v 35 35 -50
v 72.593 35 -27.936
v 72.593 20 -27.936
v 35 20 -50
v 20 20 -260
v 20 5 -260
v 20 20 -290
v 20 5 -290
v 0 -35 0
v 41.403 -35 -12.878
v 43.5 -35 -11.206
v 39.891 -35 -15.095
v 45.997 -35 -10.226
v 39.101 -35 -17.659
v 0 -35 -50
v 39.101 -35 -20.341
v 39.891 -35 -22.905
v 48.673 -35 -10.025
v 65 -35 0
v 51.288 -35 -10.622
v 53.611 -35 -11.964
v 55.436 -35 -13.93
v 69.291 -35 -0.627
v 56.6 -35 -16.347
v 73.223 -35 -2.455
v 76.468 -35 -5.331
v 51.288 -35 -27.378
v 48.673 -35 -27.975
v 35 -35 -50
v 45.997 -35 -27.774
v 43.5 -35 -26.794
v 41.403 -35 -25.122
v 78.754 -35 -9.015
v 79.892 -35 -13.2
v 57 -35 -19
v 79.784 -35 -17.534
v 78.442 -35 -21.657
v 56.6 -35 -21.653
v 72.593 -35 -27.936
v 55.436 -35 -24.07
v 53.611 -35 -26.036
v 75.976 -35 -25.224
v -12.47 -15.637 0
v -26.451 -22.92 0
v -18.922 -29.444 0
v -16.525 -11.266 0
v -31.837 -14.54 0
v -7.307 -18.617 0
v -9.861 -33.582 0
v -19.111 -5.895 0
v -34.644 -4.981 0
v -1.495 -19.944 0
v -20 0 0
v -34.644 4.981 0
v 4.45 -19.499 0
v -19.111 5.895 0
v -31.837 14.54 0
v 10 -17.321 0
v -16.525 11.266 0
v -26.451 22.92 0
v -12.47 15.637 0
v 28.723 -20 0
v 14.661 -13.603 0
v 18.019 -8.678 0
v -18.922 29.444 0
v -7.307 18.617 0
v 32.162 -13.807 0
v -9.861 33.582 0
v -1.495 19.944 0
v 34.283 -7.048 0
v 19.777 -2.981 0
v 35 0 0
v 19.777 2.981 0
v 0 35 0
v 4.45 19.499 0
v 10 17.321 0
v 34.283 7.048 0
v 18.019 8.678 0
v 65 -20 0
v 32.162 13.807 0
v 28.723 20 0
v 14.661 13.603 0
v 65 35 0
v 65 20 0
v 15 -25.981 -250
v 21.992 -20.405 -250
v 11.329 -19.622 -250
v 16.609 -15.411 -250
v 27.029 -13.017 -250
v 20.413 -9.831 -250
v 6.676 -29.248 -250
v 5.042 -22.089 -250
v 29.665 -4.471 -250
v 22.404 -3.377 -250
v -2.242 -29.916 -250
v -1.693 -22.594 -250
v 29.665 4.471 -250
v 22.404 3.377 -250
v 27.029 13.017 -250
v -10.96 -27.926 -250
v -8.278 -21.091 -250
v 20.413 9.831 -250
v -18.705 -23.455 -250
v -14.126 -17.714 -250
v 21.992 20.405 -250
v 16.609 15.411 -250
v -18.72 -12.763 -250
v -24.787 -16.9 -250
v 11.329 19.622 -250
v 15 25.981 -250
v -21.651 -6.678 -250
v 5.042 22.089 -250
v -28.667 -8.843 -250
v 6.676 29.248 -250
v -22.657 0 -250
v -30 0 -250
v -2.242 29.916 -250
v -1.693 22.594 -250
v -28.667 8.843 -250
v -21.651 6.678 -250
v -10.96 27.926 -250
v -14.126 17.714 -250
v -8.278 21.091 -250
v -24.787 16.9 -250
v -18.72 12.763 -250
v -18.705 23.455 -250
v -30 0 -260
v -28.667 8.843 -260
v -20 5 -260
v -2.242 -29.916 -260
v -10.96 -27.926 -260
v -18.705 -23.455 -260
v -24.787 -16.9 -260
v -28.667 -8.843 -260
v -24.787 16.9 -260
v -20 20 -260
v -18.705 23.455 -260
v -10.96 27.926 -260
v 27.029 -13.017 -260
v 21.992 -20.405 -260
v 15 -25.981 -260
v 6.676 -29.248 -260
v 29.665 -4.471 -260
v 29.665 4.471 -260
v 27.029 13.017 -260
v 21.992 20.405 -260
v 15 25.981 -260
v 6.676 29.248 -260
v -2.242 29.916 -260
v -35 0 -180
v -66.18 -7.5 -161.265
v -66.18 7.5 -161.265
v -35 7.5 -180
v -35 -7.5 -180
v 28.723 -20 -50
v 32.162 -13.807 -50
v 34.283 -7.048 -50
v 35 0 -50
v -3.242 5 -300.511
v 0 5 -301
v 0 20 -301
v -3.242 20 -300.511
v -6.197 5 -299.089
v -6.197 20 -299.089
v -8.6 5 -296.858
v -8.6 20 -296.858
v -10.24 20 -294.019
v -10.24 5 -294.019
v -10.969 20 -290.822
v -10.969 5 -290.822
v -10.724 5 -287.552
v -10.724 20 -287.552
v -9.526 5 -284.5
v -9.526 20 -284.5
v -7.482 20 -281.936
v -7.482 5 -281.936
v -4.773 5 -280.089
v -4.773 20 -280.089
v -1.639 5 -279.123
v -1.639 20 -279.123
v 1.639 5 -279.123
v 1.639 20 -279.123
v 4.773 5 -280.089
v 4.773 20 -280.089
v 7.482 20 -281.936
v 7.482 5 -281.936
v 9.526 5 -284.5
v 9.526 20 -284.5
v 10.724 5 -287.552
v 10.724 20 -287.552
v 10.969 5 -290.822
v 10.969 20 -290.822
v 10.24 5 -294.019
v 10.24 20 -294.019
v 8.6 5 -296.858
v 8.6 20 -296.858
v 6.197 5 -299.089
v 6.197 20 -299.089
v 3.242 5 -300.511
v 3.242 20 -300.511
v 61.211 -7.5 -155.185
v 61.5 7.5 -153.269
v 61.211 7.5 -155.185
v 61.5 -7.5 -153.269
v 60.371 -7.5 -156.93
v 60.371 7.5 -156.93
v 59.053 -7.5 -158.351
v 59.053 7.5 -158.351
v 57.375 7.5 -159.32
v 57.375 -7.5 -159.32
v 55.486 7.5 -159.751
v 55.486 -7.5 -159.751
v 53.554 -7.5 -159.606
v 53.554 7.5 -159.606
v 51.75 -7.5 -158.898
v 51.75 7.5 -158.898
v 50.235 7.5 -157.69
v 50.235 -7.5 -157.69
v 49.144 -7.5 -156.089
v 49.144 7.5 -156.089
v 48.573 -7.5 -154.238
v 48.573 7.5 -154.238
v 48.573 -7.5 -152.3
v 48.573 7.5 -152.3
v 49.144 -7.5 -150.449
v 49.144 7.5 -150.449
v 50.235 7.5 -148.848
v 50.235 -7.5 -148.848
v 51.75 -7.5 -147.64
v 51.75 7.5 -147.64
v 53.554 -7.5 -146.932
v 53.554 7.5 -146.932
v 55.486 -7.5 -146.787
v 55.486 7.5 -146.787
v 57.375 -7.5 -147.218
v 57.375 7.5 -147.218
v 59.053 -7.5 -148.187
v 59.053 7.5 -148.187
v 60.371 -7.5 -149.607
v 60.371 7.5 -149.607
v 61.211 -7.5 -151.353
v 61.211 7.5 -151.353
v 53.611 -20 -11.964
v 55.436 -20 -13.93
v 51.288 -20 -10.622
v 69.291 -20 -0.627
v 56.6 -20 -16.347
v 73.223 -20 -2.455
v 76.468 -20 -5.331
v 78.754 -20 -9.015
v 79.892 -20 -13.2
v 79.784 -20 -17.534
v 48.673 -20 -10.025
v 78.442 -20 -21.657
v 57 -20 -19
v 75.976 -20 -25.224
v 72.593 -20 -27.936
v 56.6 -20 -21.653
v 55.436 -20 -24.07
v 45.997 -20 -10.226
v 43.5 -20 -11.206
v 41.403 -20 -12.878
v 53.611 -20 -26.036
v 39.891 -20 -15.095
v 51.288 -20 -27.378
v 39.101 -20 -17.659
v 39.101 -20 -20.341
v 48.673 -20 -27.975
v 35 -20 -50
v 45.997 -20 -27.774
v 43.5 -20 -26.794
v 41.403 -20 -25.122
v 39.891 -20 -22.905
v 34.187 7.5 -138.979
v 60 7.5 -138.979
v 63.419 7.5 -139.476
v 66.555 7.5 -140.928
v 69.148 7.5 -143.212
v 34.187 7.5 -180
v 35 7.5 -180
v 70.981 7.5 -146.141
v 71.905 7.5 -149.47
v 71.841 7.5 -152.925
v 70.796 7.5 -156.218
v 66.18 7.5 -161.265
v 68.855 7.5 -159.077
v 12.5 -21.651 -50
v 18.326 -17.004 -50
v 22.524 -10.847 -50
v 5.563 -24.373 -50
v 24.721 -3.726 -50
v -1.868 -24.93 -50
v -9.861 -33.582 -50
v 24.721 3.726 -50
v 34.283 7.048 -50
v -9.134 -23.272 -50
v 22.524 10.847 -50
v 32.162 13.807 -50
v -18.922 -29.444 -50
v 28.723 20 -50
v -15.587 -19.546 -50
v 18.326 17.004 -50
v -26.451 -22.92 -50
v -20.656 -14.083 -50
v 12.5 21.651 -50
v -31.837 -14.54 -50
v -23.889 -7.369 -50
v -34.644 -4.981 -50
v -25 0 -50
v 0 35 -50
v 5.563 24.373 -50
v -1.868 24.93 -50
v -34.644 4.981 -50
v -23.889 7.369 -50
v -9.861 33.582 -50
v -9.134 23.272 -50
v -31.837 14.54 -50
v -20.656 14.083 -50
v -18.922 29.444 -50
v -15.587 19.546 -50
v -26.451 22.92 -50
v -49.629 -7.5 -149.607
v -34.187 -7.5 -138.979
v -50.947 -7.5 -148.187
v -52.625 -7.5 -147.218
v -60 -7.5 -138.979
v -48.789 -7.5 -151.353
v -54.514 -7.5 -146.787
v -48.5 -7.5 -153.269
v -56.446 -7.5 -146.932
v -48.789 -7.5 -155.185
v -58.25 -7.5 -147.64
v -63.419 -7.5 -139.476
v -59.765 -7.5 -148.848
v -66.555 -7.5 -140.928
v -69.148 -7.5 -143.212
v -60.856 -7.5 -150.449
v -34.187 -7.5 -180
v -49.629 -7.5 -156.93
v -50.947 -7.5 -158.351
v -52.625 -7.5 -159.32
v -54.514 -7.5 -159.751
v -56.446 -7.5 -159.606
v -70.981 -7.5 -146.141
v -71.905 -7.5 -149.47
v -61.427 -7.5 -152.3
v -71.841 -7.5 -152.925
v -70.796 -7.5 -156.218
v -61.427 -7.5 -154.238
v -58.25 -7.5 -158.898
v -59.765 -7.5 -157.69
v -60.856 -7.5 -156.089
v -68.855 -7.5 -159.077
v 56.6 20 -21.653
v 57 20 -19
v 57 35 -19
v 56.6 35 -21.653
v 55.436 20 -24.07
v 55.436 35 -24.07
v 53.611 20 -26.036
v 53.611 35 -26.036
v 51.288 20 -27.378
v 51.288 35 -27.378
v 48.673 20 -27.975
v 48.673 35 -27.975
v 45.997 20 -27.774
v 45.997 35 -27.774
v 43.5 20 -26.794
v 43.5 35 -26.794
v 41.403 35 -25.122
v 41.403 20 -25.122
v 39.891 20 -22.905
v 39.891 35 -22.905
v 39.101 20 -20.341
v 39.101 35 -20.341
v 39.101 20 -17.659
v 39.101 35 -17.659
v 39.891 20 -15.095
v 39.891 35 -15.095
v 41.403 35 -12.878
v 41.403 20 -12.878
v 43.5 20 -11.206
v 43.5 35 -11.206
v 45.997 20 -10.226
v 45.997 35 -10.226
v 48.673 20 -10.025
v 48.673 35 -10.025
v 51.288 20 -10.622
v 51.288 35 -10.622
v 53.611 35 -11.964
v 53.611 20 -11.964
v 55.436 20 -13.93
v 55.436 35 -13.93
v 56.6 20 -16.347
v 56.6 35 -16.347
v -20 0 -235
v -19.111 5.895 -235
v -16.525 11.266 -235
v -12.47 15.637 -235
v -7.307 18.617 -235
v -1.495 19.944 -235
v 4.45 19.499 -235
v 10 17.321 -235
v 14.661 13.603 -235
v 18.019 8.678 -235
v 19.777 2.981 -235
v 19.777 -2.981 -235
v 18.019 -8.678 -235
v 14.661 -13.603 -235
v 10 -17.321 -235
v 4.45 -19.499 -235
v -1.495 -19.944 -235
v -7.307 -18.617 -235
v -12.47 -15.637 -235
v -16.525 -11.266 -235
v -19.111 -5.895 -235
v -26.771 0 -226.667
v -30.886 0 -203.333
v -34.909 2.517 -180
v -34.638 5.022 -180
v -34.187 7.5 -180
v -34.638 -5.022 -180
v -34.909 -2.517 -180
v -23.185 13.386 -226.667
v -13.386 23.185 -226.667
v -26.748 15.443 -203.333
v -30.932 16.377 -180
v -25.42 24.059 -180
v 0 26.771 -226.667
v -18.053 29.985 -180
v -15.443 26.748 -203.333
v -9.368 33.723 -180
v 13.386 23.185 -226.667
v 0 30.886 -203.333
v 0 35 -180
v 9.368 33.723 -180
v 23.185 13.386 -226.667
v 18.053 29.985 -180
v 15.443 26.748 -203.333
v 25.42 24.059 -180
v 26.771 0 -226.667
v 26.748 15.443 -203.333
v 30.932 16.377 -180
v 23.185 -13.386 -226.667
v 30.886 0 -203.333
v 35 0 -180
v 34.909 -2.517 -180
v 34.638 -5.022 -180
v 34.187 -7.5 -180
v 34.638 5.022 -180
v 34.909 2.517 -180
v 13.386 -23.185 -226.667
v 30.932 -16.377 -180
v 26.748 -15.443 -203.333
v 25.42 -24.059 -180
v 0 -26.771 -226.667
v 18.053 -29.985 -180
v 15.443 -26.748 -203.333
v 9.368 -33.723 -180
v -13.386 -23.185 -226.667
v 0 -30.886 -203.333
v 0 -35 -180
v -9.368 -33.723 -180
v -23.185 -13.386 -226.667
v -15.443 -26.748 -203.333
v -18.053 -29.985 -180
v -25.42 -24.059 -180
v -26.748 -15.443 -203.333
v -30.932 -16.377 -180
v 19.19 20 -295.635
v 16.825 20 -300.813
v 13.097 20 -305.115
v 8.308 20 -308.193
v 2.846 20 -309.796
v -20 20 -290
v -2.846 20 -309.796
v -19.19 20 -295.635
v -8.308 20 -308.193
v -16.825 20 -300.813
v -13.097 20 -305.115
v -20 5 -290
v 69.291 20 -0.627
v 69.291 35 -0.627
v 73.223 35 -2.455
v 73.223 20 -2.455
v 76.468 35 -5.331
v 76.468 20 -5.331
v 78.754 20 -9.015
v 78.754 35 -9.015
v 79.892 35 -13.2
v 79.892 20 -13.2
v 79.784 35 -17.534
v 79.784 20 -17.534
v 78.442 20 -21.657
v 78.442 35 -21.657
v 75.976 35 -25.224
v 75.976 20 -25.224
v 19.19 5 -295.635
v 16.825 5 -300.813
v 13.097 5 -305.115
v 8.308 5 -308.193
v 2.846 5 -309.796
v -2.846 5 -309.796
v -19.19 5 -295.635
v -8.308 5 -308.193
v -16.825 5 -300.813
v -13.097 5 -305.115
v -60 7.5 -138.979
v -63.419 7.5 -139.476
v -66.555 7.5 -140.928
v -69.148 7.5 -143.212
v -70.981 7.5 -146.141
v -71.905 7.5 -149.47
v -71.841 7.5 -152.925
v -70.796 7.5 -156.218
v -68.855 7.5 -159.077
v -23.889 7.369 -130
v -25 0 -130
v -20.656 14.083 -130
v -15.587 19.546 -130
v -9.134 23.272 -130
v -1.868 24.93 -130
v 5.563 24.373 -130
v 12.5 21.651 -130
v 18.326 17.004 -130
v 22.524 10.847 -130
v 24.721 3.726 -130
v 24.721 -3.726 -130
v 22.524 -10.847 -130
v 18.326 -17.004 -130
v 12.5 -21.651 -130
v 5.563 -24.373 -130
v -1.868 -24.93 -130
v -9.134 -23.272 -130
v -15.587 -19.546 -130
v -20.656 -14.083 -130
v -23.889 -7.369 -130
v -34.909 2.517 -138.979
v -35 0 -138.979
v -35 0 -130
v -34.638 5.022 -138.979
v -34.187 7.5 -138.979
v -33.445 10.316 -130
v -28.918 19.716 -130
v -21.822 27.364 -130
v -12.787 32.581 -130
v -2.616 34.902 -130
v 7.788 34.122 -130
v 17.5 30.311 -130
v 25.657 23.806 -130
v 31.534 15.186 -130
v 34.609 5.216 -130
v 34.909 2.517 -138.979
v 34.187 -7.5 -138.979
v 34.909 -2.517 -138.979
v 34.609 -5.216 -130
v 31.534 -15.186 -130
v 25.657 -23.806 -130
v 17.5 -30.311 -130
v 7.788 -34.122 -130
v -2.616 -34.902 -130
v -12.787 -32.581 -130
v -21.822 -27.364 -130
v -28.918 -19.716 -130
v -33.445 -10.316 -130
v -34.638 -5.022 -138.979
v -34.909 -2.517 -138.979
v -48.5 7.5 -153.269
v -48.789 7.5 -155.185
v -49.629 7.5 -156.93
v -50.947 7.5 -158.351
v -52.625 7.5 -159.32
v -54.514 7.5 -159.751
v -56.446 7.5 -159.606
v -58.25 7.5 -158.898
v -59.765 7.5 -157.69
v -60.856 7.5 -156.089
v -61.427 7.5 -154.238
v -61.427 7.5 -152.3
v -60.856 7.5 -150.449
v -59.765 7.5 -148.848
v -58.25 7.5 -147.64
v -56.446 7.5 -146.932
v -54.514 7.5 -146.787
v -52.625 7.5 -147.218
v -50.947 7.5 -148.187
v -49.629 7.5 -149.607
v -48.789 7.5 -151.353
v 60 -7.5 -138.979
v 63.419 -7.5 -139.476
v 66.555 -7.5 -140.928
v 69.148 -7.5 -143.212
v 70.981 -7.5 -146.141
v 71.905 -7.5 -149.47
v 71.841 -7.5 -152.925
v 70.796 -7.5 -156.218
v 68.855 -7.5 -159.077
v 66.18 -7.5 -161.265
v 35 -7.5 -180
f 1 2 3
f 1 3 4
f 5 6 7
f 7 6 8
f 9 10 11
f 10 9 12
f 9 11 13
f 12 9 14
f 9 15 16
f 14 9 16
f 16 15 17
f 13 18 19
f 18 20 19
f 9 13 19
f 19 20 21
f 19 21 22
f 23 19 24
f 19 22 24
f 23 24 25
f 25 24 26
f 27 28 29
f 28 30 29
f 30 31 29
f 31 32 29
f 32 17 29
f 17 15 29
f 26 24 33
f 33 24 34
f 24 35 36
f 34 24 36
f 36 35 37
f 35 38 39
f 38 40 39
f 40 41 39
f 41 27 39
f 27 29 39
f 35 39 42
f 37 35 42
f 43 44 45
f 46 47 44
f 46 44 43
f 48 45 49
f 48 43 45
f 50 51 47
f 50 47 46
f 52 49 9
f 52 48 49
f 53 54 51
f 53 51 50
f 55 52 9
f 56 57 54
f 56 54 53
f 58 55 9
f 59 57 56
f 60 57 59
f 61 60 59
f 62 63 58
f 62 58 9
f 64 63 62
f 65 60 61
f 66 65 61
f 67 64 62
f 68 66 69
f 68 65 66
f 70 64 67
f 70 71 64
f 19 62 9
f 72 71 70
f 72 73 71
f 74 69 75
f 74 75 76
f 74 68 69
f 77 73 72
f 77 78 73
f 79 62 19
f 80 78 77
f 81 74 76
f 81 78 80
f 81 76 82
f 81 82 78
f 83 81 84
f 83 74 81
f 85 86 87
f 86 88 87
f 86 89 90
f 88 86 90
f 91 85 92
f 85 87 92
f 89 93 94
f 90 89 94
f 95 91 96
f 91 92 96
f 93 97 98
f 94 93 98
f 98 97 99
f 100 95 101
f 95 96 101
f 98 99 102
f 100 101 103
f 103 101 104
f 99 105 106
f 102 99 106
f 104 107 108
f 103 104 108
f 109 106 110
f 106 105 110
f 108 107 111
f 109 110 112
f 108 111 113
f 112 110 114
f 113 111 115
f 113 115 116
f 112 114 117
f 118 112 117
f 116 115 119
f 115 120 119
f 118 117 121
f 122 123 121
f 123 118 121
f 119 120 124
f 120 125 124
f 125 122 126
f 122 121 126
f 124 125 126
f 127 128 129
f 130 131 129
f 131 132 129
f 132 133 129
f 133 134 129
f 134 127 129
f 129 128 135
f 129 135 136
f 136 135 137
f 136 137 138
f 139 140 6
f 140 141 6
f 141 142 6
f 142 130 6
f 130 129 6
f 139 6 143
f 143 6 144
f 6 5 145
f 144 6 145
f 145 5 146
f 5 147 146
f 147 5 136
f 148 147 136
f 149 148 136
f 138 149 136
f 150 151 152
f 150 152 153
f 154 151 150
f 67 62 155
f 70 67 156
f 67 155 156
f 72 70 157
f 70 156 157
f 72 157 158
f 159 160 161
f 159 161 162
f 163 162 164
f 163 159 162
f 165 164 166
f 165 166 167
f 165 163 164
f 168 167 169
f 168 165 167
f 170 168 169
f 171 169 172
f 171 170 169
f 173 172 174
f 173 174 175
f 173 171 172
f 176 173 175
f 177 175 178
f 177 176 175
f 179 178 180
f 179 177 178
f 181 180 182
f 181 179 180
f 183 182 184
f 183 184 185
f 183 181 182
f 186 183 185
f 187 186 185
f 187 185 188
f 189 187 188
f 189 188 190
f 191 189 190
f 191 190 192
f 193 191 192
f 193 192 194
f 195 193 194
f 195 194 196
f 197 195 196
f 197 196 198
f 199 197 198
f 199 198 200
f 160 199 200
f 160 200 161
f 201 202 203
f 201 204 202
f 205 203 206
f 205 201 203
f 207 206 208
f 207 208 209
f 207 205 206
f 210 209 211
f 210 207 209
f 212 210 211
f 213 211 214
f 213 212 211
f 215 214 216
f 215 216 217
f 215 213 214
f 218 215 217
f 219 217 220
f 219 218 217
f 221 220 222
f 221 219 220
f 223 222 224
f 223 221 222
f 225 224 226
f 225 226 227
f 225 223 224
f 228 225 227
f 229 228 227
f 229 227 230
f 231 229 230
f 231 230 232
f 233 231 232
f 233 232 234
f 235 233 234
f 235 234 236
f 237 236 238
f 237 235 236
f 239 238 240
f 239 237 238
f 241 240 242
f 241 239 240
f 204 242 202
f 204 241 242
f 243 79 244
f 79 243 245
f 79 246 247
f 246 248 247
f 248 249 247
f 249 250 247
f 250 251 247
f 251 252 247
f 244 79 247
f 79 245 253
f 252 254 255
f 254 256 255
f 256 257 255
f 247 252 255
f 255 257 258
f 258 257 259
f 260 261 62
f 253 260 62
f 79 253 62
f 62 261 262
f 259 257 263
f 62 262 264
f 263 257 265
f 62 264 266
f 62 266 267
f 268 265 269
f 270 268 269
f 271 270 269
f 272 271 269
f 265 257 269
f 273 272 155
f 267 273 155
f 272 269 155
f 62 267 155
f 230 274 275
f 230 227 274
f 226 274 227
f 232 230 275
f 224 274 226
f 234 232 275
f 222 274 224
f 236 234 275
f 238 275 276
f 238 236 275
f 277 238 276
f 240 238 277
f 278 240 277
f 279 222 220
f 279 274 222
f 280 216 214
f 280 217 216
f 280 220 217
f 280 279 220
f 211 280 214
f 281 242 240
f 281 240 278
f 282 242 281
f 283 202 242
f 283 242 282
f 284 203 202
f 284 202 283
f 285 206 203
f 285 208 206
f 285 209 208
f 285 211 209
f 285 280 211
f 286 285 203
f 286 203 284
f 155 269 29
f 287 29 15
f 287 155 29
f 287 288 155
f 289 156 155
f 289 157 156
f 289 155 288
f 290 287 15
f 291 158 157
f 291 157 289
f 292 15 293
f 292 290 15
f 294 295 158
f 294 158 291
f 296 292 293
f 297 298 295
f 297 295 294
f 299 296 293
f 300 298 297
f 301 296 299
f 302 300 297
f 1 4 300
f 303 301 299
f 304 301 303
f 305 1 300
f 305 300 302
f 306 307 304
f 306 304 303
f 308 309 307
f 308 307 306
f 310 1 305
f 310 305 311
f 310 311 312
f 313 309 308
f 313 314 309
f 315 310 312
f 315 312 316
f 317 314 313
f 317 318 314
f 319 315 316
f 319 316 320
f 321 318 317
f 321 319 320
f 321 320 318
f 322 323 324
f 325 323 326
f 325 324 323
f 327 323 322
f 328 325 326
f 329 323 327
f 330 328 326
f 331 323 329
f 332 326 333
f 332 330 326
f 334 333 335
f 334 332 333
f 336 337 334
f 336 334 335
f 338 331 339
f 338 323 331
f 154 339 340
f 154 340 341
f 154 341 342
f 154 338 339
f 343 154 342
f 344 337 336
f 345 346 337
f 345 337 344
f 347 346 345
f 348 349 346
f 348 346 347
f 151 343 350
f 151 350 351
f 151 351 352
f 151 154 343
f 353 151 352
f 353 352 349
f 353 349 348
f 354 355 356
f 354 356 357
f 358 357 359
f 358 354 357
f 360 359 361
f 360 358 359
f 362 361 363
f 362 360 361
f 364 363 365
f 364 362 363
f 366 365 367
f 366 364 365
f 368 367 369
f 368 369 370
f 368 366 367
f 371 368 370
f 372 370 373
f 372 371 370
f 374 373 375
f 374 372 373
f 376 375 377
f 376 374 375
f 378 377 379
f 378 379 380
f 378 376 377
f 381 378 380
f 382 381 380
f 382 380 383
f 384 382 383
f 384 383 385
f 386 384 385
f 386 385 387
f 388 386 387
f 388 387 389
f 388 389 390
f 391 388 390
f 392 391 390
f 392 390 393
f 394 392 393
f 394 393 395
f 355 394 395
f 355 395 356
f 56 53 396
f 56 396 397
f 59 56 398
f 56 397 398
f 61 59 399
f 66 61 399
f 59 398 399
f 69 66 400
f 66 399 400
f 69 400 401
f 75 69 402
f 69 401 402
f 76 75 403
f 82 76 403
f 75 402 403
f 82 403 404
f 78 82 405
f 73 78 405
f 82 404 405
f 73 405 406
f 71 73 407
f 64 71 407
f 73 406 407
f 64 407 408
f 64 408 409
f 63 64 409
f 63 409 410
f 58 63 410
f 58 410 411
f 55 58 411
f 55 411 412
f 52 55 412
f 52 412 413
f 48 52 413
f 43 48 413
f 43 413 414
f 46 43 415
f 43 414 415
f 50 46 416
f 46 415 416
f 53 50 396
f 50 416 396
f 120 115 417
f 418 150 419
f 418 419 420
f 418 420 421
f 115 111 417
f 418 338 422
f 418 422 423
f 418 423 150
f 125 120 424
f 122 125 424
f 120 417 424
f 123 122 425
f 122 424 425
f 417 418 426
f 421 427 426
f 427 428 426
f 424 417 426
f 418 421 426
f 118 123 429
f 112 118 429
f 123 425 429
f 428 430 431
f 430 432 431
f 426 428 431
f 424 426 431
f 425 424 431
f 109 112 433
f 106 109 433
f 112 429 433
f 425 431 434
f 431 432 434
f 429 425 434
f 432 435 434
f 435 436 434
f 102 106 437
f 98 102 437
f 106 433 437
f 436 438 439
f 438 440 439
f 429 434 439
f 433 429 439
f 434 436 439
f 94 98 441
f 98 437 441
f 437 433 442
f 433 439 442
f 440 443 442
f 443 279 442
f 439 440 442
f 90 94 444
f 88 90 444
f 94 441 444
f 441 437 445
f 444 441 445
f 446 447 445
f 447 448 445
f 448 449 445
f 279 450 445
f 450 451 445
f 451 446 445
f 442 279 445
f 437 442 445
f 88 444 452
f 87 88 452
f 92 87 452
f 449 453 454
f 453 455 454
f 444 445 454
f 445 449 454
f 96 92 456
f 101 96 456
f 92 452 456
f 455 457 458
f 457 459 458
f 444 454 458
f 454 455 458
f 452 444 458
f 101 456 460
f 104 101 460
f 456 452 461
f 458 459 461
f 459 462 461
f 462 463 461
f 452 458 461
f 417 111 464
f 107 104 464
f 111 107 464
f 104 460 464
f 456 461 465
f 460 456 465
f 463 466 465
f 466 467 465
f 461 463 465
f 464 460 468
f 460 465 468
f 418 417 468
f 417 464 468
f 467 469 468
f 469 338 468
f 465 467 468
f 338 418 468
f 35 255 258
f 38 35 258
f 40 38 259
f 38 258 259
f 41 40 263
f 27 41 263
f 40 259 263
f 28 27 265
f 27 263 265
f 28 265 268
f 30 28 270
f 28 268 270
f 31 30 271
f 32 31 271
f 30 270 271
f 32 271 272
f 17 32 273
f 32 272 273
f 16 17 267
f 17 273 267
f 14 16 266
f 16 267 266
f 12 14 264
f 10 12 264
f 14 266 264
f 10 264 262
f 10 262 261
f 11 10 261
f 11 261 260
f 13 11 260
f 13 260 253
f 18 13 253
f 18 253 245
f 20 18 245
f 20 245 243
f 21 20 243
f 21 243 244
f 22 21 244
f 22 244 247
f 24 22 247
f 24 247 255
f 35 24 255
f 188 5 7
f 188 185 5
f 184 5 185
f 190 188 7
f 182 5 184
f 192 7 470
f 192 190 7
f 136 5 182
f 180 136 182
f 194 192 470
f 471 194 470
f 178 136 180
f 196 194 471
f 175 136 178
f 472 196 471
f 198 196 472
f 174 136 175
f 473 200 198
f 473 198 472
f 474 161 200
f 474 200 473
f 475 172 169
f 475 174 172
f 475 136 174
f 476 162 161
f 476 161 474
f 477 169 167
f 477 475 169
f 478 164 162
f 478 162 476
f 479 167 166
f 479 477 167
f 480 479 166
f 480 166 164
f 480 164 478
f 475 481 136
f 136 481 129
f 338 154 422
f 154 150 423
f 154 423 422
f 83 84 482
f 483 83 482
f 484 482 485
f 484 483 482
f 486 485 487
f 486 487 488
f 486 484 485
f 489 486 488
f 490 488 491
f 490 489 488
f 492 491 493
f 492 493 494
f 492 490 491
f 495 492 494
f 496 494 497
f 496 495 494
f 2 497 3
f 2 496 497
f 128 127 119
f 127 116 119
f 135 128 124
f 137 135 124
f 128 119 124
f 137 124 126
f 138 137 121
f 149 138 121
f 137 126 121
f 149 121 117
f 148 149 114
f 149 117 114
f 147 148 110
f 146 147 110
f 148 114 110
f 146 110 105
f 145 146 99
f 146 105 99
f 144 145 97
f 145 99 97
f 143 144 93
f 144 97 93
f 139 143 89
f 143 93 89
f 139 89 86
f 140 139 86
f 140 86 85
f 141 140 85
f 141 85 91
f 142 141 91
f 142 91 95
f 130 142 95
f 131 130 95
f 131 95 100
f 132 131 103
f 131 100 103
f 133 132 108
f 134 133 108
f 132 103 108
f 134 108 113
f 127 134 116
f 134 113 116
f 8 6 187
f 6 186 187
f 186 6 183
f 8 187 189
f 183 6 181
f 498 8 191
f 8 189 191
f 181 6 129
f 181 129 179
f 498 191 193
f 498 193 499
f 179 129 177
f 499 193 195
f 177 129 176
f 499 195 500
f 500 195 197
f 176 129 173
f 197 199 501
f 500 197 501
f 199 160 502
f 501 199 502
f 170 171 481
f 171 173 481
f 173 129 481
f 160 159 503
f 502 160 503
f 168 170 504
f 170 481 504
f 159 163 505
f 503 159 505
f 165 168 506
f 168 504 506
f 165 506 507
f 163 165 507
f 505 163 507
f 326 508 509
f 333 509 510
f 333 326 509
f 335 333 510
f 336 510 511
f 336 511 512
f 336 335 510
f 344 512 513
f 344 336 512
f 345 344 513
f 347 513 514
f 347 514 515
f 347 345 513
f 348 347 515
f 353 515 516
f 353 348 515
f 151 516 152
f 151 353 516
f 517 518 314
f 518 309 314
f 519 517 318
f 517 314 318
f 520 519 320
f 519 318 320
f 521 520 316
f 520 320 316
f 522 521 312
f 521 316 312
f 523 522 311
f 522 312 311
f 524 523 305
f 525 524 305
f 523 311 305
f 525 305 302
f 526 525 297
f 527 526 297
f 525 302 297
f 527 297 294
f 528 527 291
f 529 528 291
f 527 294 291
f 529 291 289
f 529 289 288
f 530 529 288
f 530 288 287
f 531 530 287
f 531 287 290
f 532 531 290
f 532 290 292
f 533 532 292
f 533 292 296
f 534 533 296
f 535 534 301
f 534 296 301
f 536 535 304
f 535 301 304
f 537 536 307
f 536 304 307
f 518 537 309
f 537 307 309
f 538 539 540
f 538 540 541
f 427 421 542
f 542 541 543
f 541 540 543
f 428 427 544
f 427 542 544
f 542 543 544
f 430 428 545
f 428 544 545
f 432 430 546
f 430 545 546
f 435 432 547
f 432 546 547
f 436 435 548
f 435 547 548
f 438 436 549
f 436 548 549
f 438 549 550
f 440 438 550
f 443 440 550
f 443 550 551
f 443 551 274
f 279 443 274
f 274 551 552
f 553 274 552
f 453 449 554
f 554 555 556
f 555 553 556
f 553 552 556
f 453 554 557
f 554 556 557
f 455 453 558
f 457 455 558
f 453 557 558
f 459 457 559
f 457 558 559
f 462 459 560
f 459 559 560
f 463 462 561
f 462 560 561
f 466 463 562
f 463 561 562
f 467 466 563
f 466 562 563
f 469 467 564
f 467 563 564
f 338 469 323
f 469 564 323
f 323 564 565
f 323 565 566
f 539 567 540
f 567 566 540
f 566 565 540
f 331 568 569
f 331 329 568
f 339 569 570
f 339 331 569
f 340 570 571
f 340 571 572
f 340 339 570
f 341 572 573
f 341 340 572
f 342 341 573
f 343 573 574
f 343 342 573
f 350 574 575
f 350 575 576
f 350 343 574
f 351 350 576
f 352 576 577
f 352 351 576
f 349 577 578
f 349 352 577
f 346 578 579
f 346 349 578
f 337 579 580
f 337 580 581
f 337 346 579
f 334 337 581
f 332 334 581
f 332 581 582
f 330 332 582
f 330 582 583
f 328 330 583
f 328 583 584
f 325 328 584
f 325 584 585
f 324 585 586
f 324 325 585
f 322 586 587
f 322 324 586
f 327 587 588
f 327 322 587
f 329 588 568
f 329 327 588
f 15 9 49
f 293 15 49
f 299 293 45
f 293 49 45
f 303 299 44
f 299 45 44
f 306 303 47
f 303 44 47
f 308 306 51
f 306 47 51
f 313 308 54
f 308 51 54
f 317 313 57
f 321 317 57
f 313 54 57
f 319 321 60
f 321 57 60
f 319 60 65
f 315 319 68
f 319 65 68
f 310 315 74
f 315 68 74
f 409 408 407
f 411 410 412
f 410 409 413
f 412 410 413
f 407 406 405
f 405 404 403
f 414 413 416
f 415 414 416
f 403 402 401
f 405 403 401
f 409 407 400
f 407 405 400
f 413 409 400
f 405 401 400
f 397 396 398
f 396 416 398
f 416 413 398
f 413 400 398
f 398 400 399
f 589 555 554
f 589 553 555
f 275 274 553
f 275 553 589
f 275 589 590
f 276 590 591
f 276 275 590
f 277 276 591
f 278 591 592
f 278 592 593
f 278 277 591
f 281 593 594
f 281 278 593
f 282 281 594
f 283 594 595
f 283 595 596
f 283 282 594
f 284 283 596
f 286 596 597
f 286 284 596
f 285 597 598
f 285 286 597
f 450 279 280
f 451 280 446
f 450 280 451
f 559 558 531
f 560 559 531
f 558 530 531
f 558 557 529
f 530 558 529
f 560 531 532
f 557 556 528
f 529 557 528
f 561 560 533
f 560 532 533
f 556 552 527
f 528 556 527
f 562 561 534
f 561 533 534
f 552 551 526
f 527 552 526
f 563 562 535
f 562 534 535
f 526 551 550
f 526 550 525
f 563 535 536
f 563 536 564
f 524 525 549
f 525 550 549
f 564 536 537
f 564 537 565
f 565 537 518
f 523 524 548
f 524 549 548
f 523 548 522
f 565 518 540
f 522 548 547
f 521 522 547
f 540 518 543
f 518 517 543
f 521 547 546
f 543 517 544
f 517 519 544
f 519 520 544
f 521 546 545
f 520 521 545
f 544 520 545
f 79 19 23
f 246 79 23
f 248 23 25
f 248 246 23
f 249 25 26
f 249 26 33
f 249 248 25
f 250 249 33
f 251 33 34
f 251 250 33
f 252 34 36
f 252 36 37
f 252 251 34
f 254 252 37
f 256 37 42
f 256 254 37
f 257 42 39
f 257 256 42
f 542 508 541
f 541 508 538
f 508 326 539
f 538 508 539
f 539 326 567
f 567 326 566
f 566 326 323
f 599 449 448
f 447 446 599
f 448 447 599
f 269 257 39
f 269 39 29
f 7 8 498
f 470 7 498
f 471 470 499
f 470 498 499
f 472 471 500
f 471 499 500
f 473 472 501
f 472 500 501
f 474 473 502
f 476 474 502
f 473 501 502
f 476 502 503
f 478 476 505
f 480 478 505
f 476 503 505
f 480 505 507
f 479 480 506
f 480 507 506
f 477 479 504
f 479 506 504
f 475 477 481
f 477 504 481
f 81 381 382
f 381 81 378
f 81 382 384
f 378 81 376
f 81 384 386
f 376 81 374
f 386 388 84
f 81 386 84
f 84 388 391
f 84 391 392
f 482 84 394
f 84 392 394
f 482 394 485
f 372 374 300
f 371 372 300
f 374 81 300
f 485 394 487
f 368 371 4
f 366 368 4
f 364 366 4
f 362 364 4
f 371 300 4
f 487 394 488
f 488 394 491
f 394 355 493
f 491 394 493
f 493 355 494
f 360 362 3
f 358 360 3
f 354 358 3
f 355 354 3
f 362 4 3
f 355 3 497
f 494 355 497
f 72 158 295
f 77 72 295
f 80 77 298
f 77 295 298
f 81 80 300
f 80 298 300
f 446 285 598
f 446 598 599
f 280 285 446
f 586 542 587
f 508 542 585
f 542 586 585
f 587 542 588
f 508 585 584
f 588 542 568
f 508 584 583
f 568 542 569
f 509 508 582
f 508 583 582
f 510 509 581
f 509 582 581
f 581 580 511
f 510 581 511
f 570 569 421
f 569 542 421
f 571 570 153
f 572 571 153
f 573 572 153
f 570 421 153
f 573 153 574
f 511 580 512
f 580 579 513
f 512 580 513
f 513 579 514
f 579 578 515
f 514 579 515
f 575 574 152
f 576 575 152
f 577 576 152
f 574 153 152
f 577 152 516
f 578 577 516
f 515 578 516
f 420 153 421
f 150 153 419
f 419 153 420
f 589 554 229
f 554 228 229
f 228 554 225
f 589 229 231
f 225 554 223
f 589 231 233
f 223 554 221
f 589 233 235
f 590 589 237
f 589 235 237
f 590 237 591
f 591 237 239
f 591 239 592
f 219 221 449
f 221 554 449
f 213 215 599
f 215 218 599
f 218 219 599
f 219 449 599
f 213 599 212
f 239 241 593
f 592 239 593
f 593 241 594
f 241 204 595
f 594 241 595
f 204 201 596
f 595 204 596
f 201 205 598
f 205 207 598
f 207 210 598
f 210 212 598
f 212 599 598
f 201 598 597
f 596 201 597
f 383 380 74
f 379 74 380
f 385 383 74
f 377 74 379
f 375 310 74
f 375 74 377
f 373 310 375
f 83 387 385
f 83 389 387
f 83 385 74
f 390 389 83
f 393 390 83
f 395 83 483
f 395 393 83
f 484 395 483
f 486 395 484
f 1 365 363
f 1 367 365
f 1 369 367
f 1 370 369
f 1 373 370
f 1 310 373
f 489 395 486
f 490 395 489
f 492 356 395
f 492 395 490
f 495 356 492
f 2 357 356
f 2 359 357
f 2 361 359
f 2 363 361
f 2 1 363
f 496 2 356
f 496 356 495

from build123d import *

# Parameters (mm, degrees)
SKETCH2_R                = 6.5
SKETCH2_W                = 10
SKETCH2_H                = 41.021116242
BOSS_EXTRUDE1_DEPTH      = 7.5
SKETCH3_R                = 9
BOSS_EXTRUDE2_DEPTH      = 35
BOSS_EXTRUDE2_DEPTH_BACK = 35
BOSS_EXTRUDE3_START      = -10.090847
SKETCH4_W                = 24.58727528
SKETCH4_H                = 50
BOSS_EXTRUDE3_DEPTH      = 10.090847
CUT_EXTRUDE1_DEPTH       = 51
SKETCH6_R                = 11
BOSS_EXTRUDE4_DEPTH      = 20
SKETCH6_3_R              = 11
CUT_EXTRUDE2_DEPTH       = 5


with BuildPart() as part:
    # Sketch1 → Revolve1 (revolve)
    with BuildSketch(Plane(origin=(0, 0, 0), x_dir=(1, 0, 0), z_dir=(0, 1, 0))):
        Polygon((-35, 0), (-20, 0), (-20, 235), (0, 235), (0, 260), (-30, 260), (-30, 250), (-22.65711135, 250), (-35, 180), (-35, 130), (-25, 130), (-25, 50), (-35, 50), align=None)
    revolve(axis=Axis((0, 0, 0), (0, 0, -1)))

    # Sketch2 → Boss-Extrude1 (add, symmetric)
    with BuildSketch(Plane(origin=(0, 0, 0), x_dir=(1, 0, 0), z_dir=(0, 1, 0))):
        with BuildLine():
            ThreePointArc((-60, 138.978883758), (-71.563565439, 147.772023245), (-66.180456899, 161.264891366))
            Line((-66.180456899, 161.264891366), (-35, 180))
            Line((-35, 180), (-35, 138.978883758))
            Line((-35, 138.978883758), (-60, 138.978883758))
        make_face()
        with Locations((-55, 153.268883758)):
            Circle(SKETCH2_R, mode=Mode.SUBTRACT)
        with Locations((-30, 159.489441879)):
            Rectangle(SKETCH2_W, SKETCH2_H)
        with Locations((30, 159.489441879)):
            Rectangle(SKETCH2_W, SKETCH2_H)
        with BuildLine():
            Line((35, 138.978883758), (60, 138.978883758))
            ThreePointArc((60, 138.978883758), (71.563565439, 147.772023245), (66.180456899, 161.264891366))
            Line((66.180456899, 161.264891366), (35, 180))
            Line((35, 180), (35, 138.978883758))
        make_face()
        with Locations((55, 153.268883758)):
            Circle(SKETCH2_R, mode=Mode.SUBTRACT)
    extrude(amount=BOSS_EXTRUDE1_DEPTH, both=True)

    # Sketch3 → Boss-Extrude2 (add, two sides)
    with BuildSketch(Plane(origin=(0, 0, 0), x_dir=(1, 0, 0), z_dir=(0, 1, 0))) as boss_extrude2_sk:
        with BuildLine():
            Line((35, 0), (65, 0))
            ThreePointArc((65, 0), (79.474933129, 11.066005733), (72.592573861, 27.93649188))
            Line((72.592573861, 27.93649188), (35, 50))
            Line((35, 50), (24.58727528, 50))
            Line((24.58727528, 50), (24.58727528, 0))
            Line((24.58727528, 0), (35, 0))
        make_face()
        with Locations((48, 19)):
            Circle(SKETCH3_R, mode=Mode.SUBTRACT)
    extrude(amount=BOSS_EXTRUDE2_DEPTH)
    extrude(boss_extrude2_sk.sketch, amount=-BOSS_EXTRUDE2_DEPTH_BACK)

    # Sketch4 → Boss-Extrude3 (add)
    with BuildSketch(Plane(origin=(0, 35, 0), x_dir=(1, 0, 0), z_dir=(0, 1, 0)).offset(BOSS_EXTRUDE3_START)):
        with Locations((12.29363764, 25)):
            Rectangle(SKETCH4_W, SKETCH4_H)
    boss_extrude3 = extrude(amount=BOSS_EXTRUDE3_DEPTH)

    # Mirror1: Boss-Extrude3 across plane
    add(boss_extrude3.mirror(Plane.ZX))

    # Sketch5 → Cut-Extrude1 (cut, through all)
    with BuildSketch(Plane(origin=(0, 0, -50), x_dir=(-1, 0, 0), z_dir=(0, 0, -1))):
        Polygon((-90.173846019, 20), (-90.173846019, -20), (-35, -20), (-35, -3.8e-08), (-35, 20), align=None)
        with BuildLine():
            Line((-35, 20), (-35, -3.8e-08))
            ThreePointArc((-35, -3.8e-08), (-33.393850212, 10.480971713), (-28.722813233, 20))
            Line((-28.722813233, 20), (-35, 20))
        make_face()
        with BuildLine():
            Line((-35, -3.8e-08), (-35, -20))
            Line((-35, -20), (-28.722813233, -20))
            ThreePointArc((-28.722813233, -20), (-33.3938502, -10.480971749), (-35, -3.8e-08))
        make_face()
    extrude(amount=-CUT_EXTRUDE1_DEPTH, mode=Mode.SUBTRACT)

    # Sketch6 → Boss-Extrude4 (add)
    with BuildSketch(Plane(origin=(0, 0, 0), x_dir=(0, 0, -1), z_dir=(0, 1, 0))):
        with BuildLine():
            Line((260, 20), (260, -20))
            Line((260, -20), (290, -20))
            ThreePointArc((290, -20), (310, 0), (290, 20))
            Line((290, 20), (260, 20))
        make_face()
        with Locations((290, 0)):
            Circle(SKETCH6_R, mode=Mode.SUBTRACT)
    extrude(amount=BOSS_EXTRUDE4_DEPTH)

    # Sketch6<3> → Cut-Extrude2 (cut)
    with BuildSketch(Plane(origin=(0, 0, 0), x_dir=(0, 0, -1), z_dir=(0, 1, 0))):
        with BuildLine():
            Line((260, 20), (260, -20))
            Line((260, -20), (290, -20))
            ThreePointArc((290, -20), (310, 0), (290, 20))
            Line((290, 20), (260, 20))
        make_face()
        with Locations((290, 0)):
            Circle(SKETCH6_3_R, mode=Mode.SUBTRACT)
    extrude(amount=CUT_EXTRUDE2_DEPTH, mode=Mode.SUBTRACT)


solid = part.part
